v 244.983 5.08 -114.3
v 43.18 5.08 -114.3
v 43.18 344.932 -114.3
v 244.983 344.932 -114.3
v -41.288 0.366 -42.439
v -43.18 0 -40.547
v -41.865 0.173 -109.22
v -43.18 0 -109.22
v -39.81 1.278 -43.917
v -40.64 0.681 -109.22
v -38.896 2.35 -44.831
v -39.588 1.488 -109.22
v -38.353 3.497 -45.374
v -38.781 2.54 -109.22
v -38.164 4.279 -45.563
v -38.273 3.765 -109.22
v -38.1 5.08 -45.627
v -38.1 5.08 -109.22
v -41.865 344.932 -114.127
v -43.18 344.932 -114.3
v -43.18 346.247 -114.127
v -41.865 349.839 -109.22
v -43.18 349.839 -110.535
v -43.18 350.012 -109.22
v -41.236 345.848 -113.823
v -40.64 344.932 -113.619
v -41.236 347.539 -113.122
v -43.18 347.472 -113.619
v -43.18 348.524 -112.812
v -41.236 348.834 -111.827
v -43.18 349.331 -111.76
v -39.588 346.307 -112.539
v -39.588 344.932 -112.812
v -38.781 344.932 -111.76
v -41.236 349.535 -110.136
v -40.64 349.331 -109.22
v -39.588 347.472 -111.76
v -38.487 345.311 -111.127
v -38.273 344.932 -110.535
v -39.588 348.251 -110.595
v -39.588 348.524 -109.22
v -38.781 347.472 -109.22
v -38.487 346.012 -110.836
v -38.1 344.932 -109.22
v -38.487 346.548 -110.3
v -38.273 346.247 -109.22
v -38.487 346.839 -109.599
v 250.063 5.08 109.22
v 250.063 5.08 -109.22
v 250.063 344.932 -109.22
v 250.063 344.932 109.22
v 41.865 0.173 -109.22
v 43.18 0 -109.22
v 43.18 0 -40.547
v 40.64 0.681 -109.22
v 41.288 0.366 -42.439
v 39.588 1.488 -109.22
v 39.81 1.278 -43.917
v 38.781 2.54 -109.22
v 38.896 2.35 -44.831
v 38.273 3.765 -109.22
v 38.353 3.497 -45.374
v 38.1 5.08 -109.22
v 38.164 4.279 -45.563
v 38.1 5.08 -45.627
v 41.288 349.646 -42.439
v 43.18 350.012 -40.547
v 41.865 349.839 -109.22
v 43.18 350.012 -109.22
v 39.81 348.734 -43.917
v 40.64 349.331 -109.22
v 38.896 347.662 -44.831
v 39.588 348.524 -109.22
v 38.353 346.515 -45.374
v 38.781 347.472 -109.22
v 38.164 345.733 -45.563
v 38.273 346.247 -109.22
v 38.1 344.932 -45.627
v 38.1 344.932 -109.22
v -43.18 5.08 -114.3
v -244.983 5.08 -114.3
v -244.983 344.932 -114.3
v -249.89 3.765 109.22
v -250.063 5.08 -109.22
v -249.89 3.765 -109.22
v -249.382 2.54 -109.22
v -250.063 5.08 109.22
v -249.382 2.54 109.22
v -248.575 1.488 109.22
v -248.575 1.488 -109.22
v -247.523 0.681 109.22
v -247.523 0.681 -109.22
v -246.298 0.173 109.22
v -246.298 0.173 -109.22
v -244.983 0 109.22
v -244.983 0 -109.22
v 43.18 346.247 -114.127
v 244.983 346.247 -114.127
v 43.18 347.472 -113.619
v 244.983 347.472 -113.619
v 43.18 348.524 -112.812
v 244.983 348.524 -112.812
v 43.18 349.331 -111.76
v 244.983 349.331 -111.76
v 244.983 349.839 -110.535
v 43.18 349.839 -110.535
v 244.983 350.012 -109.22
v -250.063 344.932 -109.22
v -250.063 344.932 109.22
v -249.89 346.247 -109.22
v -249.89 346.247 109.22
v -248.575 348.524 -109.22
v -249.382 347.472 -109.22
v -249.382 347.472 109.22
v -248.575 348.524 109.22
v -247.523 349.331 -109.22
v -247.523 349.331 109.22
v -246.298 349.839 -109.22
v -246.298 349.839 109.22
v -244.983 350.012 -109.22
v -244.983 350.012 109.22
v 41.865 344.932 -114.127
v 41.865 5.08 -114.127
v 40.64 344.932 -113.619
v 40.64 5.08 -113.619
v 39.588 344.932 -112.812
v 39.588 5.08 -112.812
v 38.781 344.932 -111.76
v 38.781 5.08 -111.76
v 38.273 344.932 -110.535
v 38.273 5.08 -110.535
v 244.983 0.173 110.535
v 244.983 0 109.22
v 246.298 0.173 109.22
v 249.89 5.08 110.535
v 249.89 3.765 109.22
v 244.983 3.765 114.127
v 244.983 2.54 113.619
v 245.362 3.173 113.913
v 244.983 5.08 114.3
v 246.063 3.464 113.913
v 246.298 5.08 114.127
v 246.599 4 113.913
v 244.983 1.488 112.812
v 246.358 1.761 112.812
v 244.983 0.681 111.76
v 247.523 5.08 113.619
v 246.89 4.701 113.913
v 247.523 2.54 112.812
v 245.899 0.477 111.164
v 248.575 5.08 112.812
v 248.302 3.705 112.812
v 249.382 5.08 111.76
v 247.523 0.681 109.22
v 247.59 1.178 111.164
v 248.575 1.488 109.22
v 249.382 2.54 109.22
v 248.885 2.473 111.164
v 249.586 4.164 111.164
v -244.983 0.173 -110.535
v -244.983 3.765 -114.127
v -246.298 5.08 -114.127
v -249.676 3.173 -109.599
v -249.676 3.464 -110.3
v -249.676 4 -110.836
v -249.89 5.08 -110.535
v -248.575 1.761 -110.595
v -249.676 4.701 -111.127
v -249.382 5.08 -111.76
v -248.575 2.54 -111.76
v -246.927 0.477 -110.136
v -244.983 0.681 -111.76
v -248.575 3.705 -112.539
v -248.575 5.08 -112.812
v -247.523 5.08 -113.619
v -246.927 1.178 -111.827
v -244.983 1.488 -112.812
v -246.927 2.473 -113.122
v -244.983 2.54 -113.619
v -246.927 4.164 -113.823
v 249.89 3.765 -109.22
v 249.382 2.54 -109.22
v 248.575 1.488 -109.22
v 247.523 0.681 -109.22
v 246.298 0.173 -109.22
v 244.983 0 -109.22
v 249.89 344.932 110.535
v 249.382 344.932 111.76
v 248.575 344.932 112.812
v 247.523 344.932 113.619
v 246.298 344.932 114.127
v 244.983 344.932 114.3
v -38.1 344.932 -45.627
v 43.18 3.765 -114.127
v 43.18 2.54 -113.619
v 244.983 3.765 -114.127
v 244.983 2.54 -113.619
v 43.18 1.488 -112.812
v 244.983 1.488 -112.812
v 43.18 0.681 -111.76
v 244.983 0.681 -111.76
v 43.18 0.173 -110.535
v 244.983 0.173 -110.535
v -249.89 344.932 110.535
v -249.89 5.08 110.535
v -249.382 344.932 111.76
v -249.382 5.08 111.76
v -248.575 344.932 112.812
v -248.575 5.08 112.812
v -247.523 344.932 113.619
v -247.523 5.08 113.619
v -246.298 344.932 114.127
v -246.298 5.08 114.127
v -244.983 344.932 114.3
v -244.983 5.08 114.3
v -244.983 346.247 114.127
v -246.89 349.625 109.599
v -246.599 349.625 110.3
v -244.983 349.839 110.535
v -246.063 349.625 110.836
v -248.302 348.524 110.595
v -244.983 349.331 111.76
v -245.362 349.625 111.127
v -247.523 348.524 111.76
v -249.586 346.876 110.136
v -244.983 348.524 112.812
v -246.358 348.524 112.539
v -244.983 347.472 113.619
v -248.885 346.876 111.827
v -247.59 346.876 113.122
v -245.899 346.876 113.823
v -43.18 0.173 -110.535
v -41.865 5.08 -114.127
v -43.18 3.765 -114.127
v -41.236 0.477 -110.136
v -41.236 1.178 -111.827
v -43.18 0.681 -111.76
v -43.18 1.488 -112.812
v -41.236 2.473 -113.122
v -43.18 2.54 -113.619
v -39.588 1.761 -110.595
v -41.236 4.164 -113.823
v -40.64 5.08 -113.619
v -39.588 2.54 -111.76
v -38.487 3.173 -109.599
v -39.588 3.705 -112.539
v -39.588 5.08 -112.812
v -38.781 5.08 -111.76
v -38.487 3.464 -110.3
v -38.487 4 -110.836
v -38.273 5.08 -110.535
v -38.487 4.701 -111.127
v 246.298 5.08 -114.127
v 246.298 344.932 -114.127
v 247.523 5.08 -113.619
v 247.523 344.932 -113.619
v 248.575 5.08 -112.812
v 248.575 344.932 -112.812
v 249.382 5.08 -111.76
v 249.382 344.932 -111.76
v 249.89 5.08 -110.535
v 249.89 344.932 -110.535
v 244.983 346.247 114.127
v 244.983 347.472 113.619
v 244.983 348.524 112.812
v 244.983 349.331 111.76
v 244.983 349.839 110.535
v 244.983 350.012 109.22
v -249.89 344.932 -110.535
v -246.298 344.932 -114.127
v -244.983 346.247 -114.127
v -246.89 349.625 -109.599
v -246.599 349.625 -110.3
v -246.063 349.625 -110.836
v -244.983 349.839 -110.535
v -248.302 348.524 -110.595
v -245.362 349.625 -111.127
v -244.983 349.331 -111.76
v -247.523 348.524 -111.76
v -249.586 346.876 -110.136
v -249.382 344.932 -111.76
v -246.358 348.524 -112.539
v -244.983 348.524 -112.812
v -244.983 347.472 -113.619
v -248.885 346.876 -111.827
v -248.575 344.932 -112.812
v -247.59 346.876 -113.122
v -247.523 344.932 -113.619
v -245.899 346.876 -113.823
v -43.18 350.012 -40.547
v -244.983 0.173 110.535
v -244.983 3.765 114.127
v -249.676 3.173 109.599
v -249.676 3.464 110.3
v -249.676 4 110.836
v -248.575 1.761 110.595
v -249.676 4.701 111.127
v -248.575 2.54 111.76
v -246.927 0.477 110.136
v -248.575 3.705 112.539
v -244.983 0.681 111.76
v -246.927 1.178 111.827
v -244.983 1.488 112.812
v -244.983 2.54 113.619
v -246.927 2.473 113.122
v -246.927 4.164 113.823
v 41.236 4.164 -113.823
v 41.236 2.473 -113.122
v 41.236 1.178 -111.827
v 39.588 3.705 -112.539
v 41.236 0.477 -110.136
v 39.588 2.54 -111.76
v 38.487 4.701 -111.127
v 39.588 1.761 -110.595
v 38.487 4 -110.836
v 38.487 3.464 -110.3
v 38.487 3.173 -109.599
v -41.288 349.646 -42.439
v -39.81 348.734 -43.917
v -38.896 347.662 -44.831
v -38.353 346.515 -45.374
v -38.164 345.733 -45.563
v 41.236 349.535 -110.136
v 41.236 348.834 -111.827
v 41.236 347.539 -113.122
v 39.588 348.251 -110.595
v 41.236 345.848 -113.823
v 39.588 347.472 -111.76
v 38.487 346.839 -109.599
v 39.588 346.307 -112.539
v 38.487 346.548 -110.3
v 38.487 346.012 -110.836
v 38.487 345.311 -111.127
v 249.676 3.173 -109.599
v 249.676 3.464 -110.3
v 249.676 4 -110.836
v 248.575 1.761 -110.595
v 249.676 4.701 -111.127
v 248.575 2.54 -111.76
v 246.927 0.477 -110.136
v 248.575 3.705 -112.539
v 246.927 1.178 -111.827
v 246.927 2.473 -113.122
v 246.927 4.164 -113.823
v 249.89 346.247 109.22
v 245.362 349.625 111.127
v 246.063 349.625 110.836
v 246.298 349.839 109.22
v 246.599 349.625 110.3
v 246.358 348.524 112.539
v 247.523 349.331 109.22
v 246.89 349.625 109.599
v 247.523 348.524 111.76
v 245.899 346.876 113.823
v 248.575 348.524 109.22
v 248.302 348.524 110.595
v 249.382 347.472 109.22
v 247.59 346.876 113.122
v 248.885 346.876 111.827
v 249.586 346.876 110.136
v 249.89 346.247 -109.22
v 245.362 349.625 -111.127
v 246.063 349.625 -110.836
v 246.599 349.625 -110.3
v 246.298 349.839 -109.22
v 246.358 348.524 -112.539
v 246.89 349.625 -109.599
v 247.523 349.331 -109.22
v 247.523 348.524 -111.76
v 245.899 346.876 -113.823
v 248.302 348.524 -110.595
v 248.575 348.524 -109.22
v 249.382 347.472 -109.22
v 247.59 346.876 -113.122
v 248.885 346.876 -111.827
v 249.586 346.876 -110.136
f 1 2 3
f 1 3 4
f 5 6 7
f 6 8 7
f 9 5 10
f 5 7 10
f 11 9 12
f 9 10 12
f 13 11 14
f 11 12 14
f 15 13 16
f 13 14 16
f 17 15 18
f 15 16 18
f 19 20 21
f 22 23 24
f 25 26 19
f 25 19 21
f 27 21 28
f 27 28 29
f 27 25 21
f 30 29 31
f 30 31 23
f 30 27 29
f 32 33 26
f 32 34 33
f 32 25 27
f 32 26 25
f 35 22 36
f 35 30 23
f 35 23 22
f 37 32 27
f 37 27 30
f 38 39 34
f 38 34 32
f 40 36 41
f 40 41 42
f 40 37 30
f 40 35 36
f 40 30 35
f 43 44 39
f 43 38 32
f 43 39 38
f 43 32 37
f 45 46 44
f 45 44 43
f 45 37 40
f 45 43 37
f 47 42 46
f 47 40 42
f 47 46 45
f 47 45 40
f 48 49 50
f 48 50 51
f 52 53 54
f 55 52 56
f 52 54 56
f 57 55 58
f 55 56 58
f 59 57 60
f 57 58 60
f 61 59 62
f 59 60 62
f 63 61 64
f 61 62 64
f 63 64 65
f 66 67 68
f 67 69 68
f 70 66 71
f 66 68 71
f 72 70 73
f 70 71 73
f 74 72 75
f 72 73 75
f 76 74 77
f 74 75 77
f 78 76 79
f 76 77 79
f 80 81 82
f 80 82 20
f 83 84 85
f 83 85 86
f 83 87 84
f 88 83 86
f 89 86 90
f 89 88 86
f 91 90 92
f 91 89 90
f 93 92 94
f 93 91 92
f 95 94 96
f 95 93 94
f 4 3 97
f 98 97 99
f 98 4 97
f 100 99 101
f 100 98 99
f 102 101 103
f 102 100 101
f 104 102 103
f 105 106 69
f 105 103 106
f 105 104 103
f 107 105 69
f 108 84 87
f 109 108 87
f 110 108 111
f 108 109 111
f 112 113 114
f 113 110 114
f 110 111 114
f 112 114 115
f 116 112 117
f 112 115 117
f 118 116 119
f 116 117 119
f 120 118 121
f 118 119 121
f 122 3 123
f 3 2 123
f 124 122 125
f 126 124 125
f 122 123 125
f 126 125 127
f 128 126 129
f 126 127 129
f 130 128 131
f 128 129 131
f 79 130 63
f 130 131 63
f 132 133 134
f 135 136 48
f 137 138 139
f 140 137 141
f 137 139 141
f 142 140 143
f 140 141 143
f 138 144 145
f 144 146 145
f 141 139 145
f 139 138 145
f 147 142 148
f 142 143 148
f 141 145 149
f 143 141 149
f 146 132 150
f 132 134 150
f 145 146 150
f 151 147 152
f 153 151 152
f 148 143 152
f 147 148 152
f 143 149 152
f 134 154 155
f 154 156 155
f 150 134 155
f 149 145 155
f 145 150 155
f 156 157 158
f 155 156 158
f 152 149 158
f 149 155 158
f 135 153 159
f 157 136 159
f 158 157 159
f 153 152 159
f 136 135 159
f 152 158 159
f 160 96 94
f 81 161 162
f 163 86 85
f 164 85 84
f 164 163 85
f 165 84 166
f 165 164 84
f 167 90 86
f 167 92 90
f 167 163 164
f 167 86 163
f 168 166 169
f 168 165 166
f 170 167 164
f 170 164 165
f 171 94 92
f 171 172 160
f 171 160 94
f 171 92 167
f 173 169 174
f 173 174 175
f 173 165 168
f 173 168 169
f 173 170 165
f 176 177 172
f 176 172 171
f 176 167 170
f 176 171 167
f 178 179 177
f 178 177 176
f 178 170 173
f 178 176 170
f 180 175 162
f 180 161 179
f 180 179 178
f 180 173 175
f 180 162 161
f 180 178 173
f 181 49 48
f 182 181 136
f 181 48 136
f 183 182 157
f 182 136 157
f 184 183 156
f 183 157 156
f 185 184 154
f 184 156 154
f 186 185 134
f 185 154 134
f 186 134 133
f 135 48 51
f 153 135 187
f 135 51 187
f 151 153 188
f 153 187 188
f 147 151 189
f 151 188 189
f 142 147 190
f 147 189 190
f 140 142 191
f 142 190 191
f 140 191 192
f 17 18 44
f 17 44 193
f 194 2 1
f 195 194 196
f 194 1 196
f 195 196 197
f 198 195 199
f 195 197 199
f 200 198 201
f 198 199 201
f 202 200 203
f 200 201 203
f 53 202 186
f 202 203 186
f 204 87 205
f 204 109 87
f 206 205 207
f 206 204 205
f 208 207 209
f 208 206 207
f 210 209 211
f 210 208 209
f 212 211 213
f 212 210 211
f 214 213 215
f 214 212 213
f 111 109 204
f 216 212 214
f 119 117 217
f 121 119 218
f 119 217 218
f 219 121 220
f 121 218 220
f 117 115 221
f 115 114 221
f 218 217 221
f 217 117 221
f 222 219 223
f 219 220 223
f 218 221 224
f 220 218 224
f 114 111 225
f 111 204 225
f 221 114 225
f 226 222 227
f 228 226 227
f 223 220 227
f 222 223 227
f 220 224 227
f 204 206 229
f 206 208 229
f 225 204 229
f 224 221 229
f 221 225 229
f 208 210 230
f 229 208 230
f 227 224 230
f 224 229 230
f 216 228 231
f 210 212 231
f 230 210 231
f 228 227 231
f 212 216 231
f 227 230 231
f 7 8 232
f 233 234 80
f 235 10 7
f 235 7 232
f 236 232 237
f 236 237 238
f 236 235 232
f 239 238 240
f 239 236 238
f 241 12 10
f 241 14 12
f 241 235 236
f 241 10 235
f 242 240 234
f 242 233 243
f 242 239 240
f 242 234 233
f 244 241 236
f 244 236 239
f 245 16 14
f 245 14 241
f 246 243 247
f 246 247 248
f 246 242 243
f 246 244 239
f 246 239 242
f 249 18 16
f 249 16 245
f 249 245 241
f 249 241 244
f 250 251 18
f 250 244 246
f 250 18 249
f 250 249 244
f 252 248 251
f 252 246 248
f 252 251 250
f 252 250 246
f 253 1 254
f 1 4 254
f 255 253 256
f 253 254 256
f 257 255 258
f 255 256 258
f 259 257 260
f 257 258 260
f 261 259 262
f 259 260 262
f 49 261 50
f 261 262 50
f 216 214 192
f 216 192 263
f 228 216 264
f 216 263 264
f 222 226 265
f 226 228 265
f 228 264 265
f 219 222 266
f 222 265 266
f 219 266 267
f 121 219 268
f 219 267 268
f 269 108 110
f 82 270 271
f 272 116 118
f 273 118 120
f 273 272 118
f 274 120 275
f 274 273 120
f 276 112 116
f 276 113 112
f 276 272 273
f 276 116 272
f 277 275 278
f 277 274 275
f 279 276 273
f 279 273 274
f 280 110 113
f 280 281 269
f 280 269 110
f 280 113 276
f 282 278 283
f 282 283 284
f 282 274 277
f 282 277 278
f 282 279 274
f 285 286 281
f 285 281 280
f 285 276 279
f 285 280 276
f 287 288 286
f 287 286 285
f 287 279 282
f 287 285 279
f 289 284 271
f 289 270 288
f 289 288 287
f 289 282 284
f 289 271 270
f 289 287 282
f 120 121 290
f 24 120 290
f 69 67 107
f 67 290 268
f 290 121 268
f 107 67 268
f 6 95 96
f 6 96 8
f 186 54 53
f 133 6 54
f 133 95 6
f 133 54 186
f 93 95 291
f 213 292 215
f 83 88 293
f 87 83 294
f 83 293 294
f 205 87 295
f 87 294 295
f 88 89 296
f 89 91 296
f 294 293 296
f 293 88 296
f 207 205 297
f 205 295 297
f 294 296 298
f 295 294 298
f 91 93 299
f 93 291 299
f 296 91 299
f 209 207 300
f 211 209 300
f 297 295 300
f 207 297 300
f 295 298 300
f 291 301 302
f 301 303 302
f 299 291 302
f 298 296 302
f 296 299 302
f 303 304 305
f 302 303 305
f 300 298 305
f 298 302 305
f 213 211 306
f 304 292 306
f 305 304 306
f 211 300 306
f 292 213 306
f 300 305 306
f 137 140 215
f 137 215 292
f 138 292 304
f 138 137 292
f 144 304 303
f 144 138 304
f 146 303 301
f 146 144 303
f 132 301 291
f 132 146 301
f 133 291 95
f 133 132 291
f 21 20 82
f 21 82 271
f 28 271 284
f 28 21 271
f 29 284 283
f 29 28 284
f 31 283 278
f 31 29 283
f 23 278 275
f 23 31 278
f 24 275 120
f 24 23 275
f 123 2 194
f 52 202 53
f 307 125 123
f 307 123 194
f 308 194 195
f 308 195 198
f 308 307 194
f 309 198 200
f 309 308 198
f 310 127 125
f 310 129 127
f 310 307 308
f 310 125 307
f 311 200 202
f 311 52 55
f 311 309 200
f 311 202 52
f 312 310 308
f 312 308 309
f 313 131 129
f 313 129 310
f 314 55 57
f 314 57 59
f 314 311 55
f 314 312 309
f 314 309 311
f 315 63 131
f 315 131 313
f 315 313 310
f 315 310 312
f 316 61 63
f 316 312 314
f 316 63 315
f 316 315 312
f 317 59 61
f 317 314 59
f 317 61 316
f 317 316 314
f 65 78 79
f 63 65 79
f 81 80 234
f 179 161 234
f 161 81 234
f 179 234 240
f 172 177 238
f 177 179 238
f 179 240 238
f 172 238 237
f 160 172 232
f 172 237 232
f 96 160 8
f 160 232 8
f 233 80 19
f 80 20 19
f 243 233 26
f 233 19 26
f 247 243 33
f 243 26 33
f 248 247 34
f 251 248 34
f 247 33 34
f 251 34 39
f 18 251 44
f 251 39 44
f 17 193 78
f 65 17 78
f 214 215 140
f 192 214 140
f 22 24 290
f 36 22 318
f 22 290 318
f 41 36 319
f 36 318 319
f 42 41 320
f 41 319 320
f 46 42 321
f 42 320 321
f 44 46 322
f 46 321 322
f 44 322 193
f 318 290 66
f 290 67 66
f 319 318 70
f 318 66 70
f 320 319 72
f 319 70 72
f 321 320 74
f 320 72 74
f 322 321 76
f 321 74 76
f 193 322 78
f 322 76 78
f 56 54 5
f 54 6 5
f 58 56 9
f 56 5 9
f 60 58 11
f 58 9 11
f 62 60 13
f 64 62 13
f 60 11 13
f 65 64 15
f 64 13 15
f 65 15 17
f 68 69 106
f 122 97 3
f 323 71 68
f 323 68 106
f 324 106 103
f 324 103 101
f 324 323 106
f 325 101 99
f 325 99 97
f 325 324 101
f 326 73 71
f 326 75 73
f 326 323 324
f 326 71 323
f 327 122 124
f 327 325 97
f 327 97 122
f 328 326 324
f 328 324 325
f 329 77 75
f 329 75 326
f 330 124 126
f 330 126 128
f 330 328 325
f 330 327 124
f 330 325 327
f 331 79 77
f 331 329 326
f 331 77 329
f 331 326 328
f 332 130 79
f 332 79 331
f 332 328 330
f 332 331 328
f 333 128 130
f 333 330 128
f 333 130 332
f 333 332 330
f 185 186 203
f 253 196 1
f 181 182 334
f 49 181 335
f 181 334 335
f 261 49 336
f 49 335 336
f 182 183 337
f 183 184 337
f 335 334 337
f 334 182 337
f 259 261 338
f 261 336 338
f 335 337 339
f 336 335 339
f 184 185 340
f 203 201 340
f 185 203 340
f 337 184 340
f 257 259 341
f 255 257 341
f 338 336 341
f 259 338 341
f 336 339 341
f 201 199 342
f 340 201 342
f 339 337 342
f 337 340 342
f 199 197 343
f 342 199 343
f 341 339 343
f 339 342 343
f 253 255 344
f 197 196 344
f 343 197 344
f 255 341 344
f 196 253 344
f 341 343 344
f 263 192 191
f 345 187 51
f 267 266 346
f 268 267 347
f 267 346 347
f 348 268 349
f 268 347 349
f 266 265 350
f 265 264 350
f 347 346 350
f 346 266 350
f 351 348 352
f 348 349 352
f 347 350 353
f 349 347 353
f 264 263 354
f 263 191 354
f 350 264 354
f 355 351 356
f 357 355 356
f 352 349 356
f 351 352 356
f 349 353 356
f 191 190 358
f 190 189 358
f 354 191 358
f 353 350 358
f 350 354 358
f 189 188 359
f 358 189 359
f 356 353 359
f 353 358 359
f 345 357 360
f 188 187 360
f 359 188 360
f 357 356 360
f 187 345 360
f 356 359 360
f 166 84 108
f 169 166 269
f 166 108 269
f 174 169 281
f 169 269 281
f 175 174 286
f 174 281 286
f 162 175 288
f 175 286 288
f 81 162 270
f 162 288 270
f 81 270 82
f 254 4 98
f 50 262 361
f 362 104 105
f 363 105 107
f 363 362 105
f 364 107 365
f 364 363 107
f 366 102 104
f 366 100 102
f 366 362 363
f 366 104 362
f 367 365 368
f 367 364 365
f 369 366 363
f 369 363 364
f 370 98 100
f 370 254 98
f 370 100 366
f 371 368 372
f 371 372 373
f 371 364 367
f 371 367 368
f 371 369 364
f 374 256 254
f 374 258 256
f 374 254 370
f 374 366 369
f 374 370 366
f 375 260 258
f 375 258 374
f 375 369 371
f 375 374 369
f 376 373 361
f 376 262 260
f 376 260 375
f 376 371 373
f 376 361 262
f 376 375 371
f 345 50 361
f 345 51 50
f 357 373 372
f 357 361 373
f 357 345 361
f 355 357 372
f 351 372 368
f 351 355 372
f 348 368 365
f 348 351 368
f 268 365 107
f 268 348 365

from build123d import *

# Parameters (mm, degrees)
F0_W     = 500.126
F0_H     = 228.6
F1_DEPTH = 350.012
F2_R     = 5.08
F4_DEPTH = 350.013
F5_R     = 5.08


with BuildPart() as f1:
    # F0 (on Front) → F1 (new body)
    with BuildSketch(Plane.XZ):
        Rectangle(F0_W, F0_H)
    extrude(amount=-F1_DEPTH)

    # F2
    f2_edges = [f1.edges().sort_by_distance(p)[0] for p in [
        (0, 0, -114.3),
        (250.063, 0, 0),
        (0, 0, 114.3),
        (-250.063, 0, 0),
        (-250.063, 175.006, 114.3),
        (-250.063, 175.006, -114.3),
        (-250.063, 350.012, 0),
        (250.063, 175.006, 114.3),
        (0, 350.012, 114.3),
        (250.063, 175.006, -114.3),
        (0, 350.012, -114.3),
        (250.063, 350.012, 0),
    ]]
    fillet(f2_edges, radius=F2_R)

    # F3 (on face) → F4 (cut, through all)
    with BuildSketch(Plane(origin=(0, 350.012, 0), x_dir=(-1, 0, 0), z_dir=(0, 1, 0))):
        Polygon((38.1, -94.107), (38.1, -45.6269201875), (0, -45.6269201875), (-38.1, -45.6269201875), (-38.1, -121.8269201875), (0, -121.8269201875), (38.1, -121.8269201875), align=None)
    extrude(amount=-F4_DEPTH, mode=Mode.SUBTRACT)

    # F5
    f5_edges = [f1.edges().sort_by_distance(p)[0] for p in [
        (0, 0, -45.62692),
        (-38.1, 0, -77.42346),
        (38.1, 0, -77.42346),
        (-38.1, 350.012, -77.42346),
        (0, 350.012, -45.62692),
        (38.1, 350.012, -77.42346),
        (-38.1, 175.006, -114.3),
        (-38.1, 1.487898, -112.812102),
        (-38.1, 348.524102, -112.812102),
        (38.1, 1.487898, -112.812102),
        (38.1, 348.524102, -112.812102),
        (38.1, 175.006, -114.3),
    ]]
    fillet(f5_edges, radius=F5_R)


solid = f1.part
